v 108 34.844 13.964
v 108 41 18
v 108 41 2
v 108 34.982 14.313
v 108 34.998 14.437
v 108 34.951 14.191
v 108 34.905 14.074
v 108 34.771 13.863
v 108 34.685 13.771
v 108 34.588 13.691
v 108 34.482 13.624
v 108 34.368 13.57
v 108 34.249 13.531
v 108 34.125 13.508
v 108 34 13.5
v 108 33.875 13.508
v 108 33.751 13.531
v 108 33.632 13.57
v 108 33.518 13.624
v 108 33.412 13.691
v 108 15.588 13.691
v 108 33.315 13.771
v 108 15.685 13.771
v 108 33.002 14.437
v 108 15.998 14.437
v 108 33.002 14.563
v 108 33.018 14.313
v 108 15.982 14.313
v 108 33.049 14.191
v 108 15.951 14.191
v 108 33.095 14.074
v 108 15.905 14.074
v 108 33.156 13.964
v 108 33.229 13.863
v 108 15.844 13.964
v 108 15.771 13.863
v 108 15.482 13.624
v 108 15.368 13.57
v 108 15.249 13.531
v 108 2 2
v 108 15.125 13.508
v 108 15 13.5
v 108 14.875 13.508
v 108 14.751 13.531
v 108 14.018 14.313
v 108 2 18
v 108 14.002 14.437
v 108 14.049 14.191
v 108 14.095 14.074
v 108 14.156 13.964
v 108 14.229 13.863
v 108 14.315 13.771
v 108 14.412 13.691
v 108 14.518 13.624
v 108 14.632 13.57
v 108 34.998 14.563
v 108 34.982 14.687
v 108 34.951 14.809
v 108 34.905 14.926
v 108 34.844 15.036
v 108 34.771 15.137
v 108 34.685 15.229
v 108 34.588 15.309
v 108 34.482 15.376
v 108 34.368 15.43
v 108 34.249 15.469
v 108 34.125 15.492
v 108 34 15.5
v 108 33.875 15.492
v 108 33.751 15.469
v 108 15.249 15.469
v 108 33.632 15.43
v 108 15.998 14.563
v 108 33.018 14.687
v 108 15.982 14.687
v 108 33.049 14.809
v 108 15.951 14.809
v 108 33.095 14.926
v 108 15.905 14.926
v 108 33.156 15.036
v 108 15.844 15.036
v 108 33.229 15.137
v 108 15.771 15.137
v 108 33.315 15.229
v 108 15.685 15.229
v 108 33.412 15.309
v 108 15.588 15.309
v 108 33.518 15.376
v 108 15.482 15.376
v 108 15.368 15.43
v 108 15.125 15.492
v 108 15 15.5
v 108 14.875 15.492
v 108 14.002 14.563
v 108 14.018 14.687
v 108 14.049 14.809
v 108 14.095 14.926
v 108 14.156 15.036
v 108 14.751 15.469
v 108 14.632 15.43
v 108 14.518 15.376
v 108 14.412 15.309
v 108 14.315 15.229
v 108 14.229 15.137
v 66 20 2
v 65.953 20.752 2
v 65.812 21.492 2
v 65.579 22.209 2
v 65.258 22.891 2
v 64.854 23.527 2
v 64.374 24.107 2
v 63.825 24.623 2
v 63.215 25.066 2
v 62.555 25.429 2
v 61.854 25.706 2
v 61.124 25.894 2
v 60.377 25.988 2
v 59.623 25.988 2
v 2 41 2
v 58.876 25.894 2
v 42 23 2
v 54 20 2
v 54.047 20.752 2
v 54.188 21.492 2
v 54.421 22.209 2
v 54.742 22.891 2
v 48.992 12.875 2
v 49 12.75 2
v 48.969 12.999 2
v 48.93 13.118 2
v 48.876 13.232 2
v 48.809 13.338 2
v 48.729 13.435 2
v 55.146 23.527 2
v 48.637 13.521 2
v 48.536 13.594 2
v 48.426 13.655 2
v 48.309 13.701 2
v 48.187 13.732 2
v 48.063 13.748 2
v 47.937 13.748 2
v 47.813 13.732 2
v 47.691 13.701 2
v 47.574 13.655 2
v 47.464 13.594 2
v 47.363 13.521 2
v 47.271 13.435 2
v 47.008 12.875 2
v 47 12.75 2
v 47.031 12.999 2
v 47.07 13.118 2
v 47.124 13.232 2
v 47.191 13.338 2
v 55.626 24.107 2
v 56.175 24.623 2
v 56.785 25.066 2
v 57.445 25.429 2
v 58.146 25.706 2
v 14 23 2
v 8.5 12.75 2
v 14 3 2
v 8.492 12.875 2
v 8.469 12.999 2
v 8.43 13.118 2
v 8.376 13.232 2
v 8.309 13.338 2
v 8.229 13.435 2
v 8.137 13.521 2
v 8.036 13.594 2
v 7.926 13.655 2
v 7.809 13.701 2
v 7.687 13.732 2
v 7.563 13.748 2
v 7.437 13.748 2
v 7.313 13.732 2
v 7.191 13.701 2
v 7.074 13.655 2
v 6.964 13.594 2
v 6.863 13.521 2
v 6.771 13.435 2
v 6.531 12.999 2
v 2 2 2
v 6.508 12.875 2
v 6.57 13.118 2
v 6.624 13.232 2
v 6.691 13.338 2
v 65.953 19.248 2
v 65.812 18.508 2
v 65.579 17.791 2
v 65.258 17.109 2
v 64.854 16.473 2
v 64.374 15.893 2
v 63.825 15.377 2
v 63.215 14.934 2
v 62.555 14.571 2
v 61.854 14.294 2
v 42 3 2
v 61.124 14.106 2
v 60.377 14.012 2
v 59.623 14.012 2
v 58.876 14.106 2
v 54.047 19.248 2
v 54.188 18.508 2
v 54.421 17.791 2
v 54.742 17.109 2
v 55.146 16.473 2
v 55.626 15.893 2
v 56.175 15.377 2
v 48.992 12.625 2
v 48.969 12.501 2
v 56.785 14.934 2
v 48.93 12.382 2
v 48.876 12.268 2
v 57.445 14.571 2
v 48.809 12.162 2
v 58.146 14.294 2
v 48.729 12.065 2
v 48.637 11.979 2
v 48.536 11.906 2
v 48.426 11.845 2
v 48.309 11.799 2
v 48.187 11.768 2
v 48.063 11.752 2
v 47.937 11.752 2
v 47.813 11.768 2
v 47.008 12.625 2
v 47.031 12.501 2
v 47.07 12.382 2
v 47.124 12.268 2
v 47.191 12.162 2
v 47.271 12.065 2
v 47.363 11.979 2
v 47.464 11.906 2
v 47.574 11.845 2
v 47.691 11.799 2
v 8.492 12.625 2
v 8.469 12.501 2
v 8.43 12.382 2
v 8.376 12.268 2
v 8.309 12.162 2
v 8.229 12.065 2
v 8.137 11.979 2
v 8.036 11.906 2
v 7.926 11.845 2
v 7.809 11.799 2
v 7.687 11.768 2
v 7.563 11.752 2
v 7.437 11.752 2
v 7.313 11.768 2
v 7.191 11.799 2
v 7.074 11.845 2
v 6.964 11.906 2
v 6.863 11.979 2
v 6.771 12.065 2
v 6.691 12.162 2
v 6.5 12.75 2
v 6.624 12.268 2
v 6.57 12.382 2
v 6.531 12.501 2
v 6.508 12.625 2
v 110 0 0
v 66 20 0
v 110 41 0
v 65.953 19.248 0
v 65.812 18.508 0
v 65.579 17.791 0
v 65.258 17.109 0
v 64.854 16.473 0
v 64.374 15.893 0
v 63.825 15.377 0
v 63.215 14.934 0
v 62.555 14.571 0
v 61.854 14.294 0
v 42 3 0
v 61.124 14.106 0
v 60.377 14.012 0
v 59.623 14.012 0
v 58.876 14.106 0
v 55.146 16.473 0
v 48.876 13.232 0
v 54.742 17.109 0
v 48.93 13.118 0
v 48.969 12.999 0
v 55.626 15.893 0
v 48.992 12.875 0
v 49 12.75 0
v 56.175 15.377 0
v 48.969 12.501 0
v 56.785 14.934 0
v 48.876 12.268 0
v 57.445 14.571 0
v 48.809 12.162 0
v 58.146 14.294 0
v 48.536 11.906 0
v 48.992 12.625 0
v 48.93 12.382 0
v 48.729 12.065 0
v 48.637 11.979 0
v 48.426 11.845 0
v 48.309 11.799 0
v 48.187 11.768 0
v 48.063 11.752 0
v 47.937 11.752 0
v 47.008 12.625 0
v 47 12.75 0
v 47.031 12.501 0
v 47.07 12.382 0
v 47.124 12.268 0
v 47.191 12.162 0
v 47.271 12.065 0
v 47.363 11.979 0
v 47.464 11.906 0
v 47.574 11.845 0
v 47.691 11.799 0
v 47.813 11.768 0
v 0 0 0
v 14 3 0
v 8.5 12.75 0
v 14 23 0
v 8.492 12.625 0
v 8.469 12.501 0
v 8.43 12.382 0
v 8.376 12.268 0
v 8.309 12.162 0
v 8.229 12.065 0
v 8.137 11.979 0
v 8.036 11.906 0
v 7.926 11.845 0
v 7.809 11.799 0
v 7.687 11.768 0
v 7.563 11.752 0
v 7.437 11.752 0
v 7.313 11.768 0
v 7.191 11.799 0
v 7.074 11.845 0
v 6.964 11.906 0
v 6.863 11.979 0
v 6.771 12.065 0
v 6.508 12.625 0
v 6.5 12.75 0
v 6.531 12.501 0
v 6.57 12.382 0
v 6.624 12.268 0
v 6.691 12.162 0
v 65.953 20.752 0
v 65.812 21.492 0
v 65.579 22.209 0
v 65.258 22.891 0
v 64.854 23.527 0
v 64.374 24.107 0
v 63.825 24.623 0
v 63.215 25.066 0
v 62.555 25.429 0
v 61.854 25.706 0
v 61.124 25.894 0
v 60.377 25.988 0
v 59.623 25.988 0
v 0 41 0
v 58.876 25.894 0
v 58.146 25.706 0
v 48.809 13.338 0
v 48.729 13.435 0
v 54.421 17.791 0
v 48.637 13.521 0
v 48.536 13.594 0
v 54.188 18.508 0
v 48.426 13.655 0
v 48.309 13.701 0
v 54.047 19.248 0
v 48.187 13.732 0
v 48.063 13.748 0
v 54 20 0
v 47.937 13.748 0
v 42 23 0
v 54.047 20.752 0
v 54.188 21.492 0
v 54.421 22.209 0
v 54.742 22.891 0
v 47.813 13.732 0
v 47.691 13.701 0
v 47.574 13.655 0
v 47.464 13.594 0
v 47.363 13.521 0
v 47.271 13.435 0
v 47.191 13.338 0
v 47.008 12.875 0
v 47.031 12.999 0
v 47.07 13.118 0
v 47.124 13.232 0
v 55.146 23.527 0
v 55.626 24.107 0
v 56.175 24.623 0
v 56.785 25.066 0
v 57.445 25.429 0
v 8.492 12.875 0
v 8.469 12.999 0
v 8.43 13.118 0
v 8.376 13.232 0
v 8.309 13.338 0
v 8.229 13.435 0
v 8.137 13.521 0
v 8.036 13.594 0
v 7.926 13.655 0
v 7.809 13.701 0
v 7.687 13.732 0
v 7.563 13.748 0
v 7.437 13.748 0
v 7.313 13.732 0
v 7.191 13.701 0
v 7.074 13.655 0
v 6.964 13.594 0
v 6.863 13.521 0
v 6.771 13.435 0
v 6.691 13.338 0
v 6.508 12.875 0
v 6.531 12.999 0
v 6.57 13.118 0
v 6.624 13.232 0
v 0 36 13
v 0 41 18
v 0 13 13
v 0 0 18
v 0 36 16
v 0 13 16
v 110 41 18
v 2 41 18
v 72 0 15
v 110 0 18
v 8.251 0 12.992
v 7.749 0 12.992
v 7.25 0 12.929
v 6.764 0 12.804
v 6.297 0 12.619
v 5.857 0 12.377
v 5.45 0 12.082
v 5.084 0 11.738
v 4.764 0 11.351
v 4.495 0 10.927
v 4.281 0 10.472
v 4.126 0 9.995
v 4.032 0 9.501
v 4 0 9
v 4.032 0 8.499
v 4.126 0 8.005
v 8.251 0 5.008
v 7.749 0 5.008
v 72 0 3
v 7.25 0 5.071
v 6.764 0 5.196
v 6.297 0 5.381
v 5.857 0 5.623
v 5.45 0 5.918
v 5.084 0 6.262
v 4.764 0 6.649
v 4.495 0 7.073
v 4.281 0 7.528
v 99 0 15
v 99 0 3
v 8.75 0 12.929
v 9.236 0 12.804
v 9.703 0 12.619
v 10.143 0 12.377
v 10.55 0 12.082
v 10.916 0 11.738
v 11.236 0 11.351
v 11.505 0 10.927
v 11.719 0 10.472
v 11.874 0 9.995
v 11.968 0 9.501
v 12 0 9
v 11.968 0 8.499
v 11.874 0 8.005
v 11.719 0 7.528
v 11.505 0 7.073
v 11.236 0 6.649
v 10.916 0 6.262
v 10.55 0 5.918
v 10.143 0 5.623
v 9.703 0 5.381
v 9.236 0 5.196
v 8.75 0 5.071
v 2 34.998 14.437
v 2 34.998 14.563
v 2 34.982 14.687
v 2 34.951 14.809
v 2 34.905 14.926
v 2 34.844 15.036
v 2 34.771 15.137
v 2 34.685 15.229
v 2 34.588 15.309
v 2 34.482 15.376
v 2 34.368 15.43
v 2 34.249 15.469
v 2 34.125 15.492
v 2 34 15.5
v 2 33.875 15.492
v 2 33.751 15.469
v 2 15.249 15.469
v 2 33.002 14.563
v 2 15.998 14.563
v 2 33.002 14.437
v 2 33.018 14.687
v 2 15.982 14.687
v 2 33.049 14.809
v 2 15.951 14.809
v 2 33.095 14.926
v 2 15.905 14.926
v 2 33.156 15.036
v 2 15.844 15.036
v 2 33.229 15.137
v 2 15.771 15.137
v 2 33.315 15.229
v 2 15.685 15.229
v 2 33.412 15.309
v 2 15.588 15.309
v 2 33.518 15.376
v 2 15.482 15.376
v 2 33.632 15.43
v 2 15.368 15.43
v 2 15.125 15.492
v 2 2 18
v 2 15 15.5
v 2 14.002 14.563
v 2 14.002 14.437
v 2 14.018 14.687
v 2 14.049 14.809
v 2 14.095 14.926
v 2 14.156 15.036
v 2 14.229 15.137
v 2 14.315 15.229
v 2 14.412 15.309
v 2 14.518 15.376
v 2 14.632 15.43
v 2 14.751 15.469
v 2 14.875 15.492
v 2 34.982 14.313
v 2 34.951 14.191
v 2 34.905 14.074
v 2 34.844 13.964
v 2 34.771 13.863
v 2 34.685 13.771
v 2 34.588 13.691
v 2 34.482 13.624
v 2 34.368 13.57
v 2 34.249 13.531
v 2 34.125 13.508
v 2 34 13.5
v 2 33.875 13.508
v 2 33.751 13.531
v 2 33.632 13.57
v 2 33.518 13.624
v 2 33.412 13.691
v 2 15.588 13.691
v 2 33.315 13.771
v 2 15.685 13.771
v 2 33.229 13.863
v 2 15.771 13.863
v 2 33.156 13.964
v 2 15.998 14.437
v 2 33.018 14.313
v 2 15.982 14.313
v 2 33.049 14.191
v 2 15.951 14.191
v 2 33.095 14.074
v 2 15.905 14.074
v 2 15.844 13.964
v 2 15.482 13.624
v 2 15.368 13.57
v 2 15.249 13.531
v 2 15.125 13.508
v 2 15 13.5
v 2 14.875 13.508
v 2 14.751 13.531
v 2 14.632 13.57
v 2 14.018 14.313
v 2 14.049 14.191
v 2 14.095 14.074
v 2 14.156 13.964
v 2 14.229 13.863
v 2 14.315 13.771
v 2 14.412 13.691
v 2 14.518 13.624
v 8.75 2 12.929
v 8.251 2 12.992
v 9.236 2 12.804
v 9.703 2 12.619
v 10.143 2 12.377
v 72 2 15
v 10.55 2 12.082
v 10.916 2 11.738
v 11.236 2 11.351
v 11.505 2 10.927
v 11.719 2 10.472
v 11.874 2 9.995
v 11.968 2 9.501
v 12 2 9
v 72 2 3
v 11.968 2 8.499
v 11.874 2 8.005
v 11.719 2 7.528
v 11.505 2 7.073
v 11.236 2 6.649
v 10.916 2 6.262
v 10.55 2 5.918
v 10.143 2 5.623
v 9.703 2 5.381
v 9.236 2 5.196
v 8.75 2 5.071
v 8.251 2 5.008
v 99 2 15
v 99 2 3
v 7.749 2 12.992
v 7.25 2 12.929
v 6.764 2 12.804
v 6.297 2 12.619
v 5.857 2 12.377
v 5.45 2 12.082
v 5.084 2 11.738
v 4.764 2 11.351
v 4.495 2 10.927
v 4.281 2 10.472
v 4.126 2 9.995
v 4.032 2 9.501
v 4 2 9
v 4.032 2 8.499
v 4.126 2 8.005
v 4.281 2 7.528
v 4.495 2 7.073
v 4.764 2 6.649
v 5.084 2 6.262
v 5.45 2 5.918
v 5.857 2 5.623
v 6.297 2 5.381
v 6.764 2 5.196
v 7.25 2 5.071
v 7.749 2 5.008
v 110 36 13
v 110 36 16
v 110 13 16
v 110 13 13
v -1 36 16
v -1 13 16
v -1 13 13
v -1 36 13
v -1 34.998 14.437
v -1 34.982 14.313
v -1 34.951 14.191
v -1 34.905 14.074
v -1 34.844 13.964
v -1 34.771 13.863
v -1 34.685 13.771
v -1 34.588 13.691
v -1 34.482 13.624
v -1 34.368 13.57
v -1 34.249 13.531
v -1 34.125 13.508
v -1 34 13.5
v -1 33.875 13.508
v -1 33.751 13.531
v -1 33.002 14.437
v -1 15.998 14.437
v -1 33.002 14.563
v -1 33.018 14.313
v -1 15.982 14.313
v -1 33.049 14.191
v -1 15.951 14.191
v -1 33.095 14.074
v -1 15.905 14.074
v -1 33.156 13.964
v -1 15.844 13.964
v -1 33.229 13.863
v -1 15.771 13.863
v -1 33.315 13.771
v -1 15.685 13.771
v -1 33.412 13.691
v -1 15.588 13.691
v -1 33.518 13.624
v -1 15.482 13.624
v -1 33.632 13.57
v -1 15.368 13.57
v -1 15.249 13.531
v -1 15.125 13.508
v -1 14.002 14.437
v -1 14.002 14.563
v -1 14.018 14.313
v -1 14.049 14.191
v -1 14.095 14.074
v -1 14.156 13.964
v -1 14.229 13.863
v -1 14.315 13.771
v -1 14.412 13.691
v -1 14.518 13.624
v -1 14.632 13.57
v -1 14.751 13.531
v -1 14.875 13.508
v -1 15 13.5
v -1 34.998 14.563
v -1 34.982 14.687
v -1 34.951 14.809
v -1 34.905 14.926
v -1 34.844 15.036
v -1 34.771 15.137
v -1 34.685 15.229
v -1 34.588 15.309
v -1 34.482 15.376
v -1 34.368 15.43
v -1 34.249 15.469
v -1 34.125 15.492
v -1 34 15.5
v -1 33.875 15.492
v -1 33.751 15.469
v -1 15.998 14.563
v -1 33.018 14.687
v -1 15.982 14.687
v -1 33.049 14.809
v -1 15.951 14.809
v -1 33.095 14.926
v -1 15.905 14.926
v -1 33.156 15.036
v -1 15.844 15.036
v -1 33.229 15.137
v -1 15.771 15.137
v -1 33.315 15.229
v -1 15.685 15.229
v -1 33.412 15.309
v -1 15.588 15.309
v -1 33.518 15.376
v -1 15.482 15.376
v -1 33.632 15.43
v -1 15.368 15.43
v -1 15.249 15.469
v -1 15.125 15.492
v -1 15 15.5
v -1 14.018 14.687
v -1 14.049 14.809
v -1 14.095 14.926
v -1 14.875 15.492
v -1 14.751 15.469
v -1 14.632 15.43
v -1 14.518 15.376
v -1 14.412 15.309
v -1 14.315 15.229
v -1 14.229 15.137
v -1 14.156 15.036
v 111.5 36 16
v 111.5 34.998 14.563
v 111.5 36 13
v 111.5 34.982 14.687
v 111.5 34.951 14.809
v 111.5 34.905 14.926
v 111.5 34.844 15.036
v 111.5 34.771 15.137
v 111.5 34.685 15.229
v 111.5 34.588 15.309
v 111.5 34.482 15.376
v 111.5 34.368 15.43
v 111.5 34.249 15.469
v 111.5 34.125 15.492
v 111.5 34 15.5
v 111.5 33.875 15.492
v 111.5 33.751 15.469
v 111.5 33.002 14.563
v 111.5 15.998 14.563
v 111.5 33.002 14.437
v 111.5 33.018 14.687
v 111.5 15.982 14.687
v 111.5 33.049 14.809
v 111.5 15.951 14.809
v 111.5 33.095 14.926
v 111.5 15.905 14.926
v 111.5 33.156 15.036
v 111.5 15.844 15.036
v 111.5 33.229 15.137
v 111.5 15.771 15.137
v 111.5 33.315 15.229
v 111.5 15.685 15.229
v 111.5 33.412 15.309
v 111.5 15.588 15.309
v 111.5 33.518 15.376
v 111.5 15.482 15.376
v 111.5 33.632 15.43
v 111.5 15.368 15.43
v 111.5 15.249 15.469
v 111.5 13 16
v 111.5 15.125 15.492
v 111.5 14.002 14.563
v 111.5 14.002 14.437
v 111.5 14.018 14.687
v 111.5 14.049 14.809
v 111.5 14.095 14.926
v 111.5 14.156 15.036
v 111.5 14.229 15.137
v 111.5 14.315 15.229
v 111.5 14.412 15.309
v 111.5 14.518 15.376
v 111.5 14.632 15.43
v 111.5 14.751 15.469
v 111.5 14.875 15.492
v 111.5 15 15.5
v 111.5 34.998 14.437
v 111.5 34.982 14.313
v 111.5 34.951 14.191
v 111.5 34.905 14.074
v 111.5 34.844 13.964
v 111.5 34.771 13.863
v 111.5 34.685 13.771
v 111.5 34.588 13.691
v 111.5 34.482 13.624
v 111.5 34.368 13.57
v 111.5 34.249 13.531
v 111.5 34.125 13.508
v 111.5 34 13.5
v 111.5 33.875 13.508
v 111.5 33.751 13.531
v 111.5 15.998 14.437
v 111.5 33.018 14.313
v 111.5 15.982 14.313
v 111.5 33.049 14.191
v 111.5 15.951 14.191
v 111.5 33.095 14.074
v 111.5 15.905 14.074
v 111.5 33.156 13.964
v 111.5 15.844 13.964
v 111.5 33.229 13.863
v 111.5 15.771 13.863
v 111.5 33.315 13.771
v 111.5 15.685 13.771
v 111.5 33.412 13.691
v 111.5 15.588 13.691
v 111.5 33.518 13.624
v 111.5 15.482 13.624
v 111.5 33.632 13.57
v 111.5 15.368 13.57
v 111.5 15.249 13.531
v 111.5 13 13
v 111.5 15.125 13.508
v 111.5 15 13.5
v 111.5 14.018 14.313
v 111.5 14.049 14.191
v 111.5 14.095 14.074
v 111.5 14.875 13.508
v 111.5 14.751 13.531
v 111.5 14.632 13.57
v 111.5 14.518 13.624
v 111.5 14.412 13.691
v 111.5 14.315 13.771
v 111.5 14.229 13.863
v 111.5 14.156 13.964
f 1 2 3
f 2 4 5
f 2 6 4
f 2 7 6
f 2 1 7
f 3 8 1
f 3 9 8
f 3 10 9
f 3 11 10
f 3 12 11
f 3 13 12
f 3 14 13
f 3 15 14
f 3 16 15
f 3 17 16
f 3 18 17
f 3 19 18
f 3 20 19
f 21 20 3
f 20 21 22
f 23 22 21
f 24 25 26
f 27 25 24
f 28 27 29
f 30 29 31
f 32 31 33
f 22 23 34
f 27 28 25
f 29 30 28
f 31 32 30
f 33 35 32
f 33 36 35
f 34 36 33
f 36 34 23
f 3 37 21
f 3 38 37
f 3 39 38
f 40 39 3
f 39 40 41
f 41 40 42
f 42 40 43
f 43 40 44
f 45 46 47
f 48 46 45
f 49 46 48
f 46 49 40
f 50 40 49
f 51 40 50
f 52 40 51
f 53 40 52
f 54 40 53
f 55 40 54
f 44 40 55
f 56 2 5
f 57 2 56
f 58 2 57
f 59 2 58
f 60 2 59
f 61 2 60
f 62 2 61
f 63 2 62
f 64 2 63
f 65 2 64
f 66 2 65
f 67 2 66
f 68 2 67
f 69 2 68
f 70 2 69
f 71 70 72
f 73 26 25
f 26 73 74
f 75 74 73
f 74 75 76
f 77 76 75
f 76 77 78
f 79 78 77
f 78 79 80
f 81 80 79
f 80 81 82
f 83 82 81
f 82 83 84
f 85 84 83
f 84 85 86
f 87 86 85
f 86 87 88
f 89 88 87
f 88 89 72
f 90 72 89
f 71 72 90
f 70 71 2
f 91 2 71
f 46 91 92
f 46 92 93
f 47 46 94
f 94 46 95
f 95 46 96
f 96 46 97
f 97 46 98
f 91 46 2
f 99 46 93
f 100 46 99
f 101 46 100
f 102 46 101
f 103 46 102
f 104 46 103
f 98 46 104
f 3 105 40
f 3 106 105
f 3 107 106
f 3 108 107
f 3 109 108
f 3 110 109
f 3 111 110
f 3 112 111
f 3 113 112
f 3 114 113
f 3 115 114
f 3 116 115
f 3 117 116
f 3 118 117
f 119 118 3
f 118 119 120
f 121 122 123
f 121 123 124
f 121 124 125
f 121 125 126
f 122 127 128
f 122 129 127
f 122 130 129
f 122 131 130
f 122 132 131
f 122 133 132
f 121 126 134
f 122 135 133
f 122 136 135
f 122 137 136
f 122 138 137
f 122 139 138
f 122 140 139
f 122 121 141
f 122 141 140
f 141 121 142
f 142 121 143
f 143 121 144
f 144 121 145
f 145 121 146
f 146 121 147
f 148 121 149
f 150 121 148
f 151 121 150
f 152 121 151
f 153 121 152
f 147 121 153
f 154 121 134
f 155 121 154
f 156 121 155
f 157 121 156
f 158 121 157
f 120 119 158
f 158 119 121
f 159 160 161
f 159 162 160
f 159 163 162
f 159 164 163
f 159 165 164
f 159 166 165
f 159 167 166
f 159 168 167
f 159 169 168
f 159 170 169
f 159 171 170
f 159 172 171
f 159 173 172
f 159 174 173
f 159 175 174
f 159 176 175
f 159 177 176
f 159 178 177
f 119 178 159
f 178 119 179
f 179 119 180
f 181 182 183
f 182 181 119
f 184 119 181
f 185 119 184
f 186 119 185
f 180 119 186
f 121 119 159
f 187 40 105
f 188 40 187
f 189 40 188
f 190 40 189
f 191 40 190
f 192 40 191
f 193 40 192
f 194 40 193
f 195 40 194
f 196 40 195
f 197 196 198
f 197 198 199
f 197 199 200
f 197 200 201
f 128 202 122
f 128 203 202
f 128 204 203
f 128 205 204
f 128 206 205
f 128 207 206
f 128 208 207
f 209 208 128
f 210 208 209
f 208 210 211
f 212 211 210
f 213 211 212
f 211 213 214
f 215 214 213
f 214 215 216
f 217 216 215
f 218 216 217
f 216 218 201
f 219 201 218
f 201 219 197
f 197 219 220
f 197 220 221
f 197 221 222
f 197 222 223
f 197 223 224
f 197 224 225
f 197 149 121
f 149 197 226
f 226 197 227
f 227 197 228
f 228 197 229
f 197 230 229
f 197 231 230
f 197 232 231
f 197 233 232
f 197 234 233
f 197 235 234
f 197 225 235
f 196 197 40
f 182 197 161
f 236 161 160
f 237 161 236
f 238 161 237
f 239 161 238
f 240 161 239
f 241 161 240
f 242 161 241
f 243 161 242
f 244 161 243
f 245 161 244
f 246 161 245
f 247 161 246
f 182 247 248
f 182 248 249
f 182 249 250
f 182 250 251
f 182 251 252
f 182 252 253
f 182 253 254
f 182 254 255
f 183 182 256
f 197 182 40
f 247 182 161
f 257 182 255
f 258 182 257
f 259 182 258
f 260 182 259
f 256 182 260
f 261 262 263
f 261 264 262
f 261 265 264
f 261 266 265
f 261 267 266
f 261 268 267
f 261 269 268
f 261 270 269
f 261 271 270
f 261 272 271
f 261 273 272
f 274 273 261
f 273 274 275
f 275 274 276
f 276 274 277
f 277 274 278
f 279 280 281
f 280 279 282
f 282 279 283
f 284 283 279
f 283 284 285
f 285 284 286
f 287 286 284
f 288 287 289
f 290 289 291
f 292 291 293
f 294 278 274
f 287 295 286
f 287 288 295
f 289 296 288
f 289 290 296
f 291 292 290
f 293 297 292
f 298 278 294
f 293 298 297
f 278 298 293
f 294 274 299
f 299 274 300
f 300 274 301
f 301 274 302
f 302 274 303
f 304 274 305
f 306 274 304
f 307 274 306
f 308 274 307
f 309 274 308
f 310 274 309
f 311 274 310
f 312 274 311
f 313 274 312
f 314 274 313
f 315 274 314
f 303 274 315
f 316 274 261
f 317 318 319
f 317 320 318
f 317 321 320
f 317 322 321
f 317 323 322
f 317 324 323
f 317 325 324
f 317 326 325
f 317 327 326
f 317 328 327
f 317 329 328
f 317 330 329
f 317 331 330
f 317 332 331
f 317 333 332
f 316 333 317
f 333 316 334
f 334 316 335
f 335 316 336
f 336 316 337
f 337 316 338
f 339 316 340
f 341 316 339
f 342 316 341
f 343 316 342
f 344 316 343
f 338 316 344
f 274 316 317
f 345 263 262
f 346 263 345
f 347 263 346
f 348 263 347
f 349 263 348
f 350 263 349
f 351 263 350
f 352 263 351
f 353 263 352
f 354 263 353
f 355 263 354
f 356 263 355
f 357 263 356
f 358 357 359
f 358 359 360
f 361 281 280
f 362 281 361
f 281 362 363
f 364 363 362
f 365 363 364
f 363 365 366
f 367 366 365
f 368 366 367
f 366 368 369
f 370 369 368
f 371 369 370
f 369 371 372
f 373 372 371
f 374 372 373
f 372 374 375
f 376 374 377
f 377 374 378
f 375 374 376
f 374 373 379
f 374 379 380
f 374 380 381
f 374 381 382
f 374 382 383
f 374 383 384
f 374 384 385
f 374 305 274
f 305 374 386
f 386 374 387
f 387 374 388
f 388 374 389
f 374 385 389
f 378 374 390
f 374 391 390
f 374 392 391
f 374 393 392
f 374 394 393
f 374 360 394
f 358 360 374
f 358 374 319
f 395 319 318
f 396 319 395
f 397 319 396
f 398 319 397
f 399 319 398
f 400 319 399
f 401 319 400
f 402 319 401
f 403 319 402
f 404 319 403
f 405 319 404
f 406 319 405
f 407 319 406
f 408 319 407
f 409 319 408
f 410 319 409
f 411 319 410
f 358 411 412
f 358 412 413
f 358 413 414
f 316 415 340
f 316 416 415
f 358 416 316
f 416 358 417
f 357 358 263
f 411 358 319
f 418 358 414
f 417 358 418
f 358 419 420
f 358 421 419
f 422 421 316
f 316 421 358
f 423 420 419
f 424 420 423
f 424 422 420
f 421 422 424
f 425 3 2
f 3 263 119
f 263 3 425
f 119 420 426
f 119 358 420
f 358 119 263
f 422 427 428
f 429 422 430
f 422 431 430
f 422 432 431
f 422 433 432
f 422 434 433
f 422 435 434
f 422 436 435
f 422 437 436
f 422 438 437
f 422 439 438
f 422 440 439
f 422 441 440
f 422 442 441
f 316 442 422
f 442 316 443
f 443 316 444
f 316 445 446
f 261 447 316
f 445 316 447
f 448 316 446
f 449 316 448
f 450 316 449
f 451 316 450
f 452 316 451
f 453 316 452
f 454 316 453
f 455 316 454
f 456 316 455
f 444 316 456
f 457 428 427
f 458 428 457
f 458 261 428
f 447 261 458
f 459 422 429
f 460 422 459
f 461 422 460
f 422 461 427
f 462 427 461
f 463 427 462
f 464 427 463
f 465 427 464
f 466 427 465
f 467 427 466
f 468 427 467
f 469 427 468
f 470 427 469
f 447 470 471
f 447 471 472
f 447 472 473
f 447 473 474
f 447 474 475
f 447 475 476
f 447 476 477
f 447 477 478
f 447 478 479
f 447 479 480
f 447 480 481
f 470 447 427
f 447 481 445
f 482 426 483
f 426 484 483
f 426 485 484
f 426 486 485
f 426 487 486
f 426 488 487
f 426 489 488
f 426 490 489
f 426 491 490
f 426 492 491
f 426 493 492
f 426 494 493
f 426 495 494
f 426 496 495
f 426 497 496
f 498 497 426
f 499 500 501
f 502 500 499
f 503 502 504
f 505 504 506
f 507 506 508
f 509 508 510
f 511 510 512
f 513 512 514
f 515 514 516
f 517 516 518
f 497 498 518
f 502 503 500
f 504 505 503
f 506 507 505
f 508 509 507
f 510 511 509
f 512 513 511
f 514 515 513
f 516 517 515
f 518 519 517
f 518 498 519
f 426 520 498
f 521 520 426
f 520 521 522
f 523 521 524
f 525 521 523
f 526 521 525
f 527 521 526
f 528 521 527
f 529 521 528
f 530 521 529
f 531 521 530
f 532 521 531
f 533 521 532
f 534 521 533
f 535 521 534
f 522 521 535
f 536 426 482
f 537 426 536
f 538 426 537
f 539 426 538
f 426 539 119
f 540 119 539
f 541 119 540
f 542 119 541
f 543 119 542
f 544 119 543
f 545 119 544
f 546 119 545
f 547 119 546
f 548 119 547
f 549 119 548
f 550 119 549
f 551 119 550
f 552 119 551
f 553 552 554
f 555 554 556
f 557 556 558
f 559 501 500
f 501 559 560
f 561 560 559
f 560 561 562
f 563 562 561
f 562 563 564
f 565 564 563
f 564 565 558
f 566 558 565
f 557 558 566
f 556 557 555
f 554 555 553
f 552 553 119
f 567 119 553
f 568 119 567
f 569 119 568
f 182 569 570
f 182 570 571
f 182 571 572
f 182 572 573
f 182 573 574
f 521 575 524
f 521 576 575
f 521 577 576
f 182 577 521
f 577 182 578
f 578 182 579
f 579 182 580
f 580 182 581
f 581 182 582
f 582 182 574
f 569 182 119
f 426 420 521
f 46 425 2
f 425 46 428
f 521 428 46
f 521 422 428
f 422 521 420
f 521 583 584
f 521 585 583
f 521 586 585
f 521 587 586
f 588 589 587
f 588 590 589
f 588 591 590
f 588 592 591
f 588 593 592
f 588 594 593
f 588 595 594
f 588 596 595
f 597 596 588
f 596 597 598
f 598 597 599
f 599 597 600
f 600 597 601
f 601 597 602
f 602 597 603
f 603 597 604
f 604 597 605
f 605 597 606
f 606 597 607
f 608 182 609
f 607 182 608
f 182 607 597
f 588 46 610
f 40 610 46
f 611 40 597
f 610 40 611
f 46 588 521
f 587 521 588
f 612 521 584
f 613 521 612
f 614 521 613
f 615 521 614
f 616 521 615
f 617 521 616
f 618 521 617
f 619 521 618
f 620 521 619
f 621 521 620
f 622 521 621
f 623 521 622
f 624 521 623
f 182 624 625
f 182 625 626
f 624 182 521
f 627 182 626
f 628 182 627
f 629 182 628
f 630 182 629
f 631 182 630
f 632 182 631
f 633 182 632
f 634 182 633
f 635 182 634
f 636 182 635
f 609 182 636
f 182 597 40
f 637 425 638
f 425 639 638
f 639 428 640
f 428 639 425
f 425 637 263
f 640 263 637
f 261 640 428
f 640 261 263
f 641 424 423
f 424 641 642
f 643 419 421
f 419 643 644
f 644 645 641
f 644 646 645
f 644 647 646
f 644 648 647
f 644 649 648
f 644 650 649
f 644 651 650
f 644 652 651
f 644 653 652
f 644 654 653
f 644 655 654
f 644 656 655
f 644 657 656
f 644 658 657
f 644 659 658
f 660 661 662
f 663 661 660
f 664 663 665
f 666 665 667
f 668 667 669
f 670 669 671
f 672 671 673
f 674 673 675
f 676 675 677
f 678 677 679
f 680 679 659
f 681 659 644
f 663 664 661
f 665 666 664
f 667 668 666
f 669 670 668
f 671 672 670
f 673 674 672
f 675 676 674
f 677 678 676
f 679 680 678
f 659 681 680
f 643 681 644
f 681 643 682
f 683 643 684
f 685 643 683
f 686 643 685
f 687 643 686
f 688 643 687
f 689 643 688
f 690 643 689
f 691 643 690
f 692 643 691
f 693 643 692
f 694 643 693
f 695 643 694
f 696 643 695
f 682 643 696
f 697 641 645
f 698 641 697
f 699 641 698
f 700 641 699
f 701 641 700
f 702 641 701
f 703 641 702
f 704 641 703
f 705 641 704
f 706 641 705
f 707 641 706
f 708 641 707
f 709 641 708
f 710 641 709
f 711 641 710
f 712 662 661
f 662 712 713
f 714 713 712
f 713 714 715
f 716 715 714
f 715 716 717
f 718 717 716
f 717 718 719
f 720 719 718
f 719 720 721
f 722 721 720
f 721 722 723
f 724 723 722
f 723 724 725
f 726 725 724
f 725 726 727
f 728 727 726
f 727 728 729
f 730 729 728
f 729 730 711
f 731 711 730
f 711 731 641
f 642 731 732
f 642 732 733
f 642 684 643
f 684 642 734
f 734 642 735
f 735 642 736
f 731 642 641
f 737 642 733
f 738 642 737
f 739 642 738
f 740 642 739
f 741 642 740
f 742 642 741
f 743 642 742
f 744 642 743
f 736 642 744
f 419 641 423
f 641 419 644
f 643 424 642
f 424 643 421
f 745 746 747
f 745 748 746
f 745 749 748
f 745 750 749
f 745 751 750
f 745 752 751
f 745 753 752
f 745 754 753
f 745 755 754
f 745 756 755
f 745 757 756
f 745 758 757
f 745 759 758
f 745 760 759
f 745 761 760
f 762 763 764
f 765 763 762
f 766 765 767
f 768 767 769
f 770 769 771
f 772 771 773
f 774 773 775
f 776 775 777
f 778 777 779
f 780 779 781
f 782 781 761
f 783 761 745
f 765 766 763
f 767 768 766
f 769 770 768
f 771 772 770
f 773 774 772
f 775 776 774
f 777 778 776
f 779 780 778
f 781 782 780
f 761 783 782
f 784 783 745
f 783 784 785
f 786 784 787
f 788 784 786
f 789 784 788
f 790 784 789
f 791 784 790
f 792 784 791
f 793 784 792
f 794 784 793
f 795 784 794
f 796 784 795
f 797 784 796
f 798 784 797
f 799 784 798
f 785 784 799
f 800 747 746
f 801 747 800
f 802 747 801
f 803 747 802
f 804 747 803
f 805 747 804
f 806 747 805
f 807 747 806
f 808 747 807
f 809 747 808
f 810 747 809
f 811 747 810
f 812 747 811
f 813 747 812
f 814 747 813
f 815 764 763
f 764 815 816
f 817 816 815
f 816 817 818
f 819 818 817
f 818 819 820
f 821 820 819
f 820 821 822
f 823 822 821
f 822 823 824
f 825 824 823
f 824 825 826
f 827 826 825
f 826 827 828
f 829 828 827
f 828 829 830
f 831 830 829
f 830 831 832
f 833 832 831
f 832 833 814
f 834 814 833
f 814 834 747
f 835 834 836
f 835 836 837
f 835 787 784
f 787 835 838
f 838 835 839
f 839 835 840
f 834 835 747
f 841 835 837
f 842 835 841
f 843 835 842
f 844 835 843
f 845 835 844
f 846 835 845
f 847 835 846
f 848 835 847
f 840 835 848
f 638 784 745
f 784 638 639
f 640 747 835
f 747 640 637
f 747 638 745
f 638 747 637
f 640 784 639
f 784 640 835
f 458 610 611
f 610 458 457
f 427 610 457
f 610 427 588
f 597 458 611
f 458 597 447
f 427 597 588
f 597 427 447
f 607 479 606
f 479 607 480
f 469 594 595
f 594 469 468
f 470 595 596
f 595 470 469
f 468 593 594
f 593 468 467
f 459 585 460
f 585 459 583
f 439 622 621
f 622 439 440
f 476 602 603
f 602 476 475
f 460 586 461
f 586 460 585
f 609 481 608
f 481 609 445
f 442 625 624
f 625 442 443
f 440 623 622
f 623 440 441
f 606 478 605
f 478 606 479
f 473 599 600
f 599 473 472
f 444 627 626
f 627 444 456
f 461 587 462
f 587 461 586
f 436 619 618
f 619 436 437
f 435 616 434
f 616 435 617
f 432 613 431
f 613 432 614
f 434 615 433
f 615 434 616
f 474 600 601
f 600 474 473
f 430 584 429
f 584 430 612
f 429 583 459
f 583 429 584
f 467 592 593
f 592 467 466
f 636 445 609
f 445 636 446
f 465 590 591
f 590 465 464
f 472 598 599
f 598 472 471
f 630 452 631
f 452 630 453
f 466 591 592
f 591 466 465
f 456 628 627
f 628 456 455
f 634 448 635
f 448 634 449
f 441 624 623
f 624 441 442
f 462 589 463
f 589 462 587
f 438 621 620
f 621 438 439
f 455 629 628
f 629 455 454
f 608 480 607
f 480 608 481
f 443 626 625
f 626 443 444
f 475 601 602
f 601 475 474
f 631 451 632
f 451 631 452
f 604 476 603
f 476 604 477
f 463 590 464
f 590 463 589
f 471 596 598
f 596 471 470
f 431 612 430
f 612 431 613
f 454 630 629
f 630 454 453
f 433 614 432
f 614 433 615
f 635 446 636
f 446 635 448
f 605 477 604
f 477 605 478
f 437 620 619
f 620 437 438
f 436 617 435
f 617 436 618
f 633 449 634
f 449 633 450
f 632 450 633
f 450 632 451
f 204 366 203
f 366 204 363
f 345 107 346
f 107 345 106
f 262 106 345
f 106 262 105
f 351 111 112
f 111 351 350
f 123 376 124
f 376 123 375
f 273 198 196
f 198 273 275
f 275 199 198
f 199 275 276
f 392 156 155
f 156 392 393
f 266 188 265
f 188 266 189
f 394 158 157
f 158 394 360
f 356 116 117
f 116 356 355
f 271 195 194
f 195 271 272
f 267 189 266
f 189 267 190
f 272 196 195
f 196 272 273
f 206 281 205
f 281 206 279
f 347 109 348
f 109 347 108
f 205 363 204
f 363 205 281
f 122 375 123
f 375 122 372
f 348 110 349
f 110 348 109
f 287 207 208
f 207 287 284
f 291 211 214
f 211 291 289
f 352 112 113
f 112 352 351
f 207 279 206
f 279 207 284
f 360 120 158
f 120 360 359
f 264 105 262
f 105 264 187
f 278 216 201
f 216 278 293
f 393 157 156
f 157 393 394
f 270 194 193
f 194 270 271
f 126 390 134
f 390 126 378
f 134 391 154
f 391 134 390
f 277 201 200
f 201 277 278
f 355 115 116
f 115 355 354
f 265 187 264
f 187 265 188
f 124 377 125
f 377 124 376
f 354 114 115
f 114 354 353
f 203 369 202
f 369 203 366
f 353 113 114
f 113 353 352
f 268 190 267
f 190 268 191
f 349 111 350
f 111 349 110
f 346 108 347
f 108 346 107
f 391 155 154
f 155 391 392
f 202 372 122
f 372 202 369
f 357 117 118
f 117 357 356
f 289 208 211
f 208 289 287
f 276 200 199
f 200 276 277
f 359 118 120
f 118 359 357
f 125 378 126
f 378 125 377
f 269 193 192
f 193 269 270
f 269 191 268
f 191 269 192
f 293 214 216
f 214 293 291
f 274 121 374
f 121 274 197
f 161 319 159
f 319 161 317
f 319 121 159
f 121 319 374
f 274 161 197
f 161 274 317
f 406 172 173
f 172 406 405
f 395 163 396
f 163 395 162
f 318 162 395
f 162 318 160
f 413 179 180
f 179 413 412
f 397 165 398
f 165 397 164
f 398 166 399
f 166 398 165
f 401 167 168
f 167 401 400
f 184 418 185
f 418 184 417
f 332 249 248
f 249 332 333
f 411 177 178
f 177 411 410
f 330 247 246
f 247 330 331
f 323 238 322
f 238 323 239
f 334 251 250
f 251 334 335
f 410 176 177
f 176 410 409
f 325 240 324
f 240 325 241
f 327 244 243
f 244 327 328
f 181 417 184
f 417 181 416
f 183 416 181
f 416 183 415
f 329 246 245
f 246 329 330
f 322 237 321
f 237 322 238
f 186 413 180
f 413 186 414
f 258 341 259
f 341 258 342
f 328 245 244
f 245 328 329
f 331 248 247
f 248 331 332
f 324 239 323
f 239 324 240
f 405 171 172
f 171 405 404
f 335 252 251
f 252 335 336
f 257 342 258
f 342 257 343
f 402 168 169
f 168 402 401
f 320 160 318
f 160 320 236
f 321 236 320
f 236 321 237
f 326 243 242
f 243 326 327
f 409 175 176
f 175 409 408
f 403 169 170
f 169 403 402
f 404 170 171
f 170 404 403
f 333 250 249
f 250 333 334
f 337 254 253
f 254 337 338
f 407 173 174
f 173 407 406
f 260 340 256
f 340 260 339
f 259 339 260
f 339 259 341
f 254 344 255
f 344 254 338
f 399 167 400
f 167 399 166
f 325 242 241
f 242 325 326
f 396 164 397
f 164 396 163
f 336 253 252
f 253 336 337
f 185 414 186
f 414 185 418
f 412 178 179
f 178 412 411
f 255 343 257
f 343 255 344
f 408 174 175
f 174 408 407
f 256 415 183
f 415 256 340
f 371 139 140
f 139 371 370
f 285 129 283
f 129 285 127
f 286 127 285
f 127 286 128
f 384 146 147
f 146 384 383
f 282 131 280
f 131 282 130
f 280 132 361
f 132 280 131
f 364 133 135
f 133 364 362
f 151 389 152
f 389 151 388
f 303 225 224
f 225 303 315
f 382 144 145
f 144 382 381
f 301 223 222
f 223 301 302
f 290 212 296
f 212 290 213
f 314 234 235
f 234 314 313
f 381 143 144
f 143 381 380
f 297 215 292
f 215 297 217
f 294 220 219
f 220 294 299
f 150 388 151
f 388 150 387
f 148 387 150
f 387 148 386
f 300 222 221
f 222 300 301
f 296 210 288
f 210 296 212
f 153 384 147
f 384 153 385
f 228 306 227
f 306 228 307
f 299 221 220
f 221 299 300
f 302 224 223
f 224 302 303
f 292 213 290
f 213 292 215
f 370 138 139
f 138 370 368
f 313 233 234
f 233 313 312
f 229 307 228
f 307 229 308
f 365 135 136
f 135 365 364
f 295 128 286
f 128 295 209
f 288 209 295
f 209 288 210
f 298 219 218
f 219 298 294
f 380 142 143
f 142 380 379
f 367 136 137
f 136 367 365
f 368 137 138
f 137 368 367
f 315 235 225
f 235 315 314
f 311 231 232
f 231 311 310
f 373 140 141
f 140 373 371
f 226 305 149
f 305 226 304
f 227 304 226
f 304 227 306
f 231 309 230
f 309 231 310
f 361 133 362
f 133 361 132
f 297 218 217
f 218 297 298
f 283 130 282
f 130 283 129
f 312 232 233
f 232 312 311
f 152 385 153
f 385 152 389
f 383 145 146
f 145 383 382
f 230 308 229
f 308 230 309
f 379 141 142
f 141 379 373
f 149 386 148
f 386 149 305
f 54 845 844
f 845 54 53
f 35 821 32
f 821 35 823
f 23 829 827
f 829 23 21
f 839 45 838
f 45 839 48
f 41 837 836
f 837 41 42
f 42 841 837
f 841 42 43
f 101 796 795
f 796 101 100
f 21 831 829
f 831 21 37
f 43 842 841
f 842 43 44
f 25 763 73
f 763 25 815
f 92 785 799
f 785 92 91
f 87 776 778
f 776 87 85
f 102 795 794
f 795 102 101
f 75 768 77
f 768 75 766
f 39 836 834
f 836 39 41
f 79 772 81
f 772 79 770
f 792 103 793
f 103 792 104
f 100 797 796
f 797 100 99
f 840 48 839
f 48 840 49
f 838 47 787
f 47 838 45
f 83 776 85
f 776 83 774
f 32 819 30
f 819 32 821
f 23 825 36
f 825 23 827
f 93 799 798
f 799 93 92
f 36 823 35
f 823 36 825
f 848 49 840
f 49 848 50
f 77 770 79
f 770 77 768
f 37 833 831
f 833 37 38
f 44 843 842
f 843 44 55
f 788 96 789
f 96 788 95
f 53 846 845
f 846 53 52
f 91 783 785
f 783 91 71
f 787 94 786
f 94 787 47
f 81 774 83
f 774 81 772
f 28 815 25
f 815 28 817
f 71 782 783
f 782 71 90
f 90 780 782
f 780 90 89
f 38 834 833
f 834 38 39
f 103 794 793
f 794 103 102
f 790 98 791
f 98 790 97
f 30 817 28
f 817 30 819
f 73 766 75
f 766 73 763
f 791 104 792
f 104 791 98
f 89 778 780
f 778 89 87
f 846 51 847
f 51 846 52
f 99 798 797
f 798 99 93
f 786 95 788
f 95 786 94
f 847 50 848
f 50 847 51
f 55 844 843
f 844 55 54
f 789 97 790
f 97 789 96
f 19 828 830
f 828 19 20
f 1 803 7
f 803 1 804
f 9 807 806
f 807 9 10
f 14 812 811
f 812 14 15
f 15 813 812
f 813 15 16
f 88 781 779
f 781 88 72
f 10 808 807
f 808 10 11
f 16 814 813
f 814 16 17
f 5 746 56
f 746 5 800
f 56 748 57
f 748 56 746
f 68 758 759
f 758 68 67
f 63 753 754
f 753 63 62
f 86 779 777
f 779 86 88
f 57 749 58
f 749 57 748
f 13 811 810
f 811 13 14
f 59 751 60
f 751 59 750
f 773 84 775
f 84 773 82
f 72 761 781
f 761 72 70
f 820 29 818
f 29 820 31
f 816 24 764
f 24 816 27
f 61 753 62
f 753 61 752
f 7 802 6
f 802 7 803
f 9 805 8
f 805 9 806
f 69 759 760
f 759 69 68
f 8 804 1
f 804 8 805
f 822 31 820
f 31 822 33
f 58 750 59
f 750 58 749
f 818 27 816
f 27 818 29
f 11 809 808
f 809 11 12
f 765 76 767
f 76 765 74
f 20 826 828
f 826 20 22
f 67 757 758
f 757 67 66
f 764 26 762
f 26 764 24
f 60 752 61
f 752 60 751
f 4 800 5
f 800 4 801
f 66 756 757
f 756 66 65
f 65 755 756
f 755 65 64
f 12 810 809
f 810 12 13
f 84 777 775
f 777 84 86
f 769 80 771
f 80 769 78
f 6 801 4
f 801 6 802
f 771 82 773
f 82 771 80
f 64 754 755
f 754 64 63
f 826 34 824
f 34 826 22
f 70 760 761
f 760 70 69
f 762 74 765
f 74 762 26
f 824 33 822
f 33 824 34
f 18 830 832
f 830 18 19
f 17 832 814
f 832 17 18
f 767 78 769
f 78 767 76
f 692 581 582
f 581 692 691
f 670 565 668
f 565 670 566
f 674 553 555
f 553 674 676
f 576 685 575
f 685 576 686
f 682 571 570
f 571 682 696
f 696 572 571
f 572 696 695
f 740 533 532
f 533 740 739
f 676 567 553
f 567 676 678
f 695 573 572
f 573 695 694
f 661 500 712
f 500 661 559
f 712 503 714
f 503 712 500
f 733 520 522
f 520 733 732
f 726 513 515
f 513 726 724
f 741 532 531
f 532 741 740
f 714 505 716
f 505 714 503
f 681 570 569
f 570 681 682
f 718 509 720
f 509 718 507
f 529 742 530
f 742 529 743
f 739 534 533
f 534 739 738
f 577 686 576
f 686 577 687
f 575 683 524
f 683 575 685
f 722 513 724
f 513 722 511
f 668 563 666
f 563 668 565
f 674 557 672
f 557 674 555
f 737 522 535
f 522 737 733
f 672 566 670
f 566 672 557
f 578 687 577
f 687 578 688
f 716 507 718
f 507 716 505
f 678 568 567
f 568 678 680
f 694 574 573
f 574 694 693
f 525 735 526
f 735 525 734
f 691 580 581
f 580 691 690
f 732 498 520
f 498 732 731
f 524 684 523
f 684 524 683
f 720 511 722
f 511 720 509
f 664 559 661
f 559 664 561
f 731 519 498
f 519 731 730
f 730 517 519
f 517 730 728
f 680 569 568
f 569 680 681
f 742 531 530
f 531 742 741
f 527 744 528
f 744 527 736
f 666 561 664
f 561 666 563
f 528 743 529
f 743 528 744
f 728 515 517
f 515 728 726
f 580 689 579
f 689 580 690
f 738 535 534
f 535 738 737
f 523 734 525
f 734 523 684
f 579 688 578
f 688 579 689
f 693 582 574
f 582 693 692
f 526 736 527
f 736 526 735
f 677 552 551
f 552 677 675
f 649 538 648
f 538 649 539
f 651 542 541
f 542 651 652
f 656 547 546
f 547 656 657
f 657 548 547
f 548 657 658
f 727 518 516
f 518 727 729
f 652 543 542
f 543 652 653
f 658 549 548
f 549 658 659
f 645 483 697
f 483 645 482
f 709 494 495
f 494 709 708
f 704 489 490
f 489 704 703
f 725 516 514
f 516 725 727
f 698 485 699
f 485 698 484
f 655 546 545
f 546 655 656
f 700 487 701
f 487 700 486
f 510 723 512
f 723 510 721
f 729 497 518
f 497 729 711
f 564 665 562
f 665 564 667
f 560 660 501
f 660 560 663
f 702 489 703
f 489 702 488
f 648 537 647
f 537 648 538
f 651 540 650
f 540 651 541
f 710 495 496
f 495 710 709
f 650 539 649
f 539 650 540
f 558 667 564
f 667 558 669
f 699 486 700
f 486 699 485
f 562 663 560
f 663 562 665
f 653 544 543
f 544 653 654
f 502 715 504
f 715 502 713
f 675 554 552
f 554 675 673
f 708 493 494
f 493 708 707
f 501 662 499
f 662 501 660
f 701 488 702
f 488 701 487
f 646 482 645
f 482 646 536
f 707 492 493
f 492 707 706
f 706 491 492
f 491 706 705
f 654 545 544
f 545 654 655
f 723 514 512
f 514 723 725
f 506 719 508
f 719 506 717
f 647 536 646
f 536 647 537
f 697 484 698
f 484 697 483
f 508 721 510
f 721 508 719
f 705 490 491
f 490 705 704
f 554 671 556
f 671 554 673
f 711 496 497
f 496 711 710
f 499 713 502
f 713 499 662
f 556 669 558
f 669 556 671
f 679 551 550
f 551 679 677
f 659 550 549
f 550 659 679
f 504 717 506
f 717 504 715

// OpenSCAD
// [FL_INDEX: keywords="openscad, 3d_parametric, Ultimate_Power_Supply_Terminal_Cover, csg_solid" | COT="Parametric OpenSCAD design from 3DCodeverse"]
// Title: Ultimate Power Supply Terminal Cover

/*************************************************************************************************
Power Supply Terminal Cover for the power supply commonly used with the Bukobot and other 3d printers
Author: Mike Thompson (thingiverse: mike_linus)
Date Last Modified: 11/03/2013 4:19pm
Description: simply change the cutout parameters to suit. Note: do not change length, height, depth and thickness parameters for the base unless you want to change the core dimensions.
**************************************************************************************************/

//***************************************************************
//don't change these base parameters unless you want to change the core dimensions.
//***************************************************************
hole_resolution=50;
base_length=108;
base_height=41;
base_depth=18;
base_thickness=2;
$fn=hole_resolution;

//***************************************************************
//change these cutout parameters to suit you own switch size etc.
//***************************************************************
switch_cutout_length=27;
switch_cutout_width=12;

led_cutout_radius=4;
grommet_cutout_radius=6;

power_plug_cutout_length=28;
power_plug_cutout_width=20;

screw_hole_cutout_radius=1;

module base(){
cube([base_length,base_height,base_thickness]);
cube([base_thickness,base_height,base_depth]);
cube([base_length,base_thickness,base_depth]);
translate([base_length,0,0])cube([base_thickness,base_height,base_depth]);
translate([-1,13,13])cube([1.5,23,3]);//slot retainer
translate([base_length+base_thickness,13,13])cube([1.5,23,3]);//slot retainer
}

difference(){
base();
translate([72,0,3])cube([switch_cutout_length,base_thickness,switch_cutout_width]);  //switch cutout
translate([8,3,9])rotate([90,0,0])cylinder(r=led_cutout_radius,h=5);  //led cutout
translate([60,20,0])cylinder(r=grommet_cutout_radius,h=5);  //12v lead cutout
translate([14,3,0])cube([power_plug_cutout_length,power_plug_cutout_width,base_thickness]);  //240v plug cutout
translate([7.5,12.75,0])cylinder(r=screw_hole_cutout_radius,h=5);  //240v plug screw hole
translate([48,12.75,0])cylinder(r=screw_hole_cutout_radius,h=5);  //240v plug screw hole
translate([base_length,15,14.5])rotate([0,90,0])cylinder(r=screw_hole_cutout_radius,h=5);  //retainer screw hole
translate([base_length,34,14.5])rotate([0,90,0])cylinder(r=screw_hole_cutout_radius,h=5);  //retainer screw hole
translate([-1,15,14.5])rotate([0,90,0])cylinder(r=screw_hole_cutout_radius,h=5);  //retainer screw hole
translate([-1,34,14.5])rotate([0,90,0])cylinder(r=screw_hole_cutout_radius,h=5);  //retainer screw hole
}
